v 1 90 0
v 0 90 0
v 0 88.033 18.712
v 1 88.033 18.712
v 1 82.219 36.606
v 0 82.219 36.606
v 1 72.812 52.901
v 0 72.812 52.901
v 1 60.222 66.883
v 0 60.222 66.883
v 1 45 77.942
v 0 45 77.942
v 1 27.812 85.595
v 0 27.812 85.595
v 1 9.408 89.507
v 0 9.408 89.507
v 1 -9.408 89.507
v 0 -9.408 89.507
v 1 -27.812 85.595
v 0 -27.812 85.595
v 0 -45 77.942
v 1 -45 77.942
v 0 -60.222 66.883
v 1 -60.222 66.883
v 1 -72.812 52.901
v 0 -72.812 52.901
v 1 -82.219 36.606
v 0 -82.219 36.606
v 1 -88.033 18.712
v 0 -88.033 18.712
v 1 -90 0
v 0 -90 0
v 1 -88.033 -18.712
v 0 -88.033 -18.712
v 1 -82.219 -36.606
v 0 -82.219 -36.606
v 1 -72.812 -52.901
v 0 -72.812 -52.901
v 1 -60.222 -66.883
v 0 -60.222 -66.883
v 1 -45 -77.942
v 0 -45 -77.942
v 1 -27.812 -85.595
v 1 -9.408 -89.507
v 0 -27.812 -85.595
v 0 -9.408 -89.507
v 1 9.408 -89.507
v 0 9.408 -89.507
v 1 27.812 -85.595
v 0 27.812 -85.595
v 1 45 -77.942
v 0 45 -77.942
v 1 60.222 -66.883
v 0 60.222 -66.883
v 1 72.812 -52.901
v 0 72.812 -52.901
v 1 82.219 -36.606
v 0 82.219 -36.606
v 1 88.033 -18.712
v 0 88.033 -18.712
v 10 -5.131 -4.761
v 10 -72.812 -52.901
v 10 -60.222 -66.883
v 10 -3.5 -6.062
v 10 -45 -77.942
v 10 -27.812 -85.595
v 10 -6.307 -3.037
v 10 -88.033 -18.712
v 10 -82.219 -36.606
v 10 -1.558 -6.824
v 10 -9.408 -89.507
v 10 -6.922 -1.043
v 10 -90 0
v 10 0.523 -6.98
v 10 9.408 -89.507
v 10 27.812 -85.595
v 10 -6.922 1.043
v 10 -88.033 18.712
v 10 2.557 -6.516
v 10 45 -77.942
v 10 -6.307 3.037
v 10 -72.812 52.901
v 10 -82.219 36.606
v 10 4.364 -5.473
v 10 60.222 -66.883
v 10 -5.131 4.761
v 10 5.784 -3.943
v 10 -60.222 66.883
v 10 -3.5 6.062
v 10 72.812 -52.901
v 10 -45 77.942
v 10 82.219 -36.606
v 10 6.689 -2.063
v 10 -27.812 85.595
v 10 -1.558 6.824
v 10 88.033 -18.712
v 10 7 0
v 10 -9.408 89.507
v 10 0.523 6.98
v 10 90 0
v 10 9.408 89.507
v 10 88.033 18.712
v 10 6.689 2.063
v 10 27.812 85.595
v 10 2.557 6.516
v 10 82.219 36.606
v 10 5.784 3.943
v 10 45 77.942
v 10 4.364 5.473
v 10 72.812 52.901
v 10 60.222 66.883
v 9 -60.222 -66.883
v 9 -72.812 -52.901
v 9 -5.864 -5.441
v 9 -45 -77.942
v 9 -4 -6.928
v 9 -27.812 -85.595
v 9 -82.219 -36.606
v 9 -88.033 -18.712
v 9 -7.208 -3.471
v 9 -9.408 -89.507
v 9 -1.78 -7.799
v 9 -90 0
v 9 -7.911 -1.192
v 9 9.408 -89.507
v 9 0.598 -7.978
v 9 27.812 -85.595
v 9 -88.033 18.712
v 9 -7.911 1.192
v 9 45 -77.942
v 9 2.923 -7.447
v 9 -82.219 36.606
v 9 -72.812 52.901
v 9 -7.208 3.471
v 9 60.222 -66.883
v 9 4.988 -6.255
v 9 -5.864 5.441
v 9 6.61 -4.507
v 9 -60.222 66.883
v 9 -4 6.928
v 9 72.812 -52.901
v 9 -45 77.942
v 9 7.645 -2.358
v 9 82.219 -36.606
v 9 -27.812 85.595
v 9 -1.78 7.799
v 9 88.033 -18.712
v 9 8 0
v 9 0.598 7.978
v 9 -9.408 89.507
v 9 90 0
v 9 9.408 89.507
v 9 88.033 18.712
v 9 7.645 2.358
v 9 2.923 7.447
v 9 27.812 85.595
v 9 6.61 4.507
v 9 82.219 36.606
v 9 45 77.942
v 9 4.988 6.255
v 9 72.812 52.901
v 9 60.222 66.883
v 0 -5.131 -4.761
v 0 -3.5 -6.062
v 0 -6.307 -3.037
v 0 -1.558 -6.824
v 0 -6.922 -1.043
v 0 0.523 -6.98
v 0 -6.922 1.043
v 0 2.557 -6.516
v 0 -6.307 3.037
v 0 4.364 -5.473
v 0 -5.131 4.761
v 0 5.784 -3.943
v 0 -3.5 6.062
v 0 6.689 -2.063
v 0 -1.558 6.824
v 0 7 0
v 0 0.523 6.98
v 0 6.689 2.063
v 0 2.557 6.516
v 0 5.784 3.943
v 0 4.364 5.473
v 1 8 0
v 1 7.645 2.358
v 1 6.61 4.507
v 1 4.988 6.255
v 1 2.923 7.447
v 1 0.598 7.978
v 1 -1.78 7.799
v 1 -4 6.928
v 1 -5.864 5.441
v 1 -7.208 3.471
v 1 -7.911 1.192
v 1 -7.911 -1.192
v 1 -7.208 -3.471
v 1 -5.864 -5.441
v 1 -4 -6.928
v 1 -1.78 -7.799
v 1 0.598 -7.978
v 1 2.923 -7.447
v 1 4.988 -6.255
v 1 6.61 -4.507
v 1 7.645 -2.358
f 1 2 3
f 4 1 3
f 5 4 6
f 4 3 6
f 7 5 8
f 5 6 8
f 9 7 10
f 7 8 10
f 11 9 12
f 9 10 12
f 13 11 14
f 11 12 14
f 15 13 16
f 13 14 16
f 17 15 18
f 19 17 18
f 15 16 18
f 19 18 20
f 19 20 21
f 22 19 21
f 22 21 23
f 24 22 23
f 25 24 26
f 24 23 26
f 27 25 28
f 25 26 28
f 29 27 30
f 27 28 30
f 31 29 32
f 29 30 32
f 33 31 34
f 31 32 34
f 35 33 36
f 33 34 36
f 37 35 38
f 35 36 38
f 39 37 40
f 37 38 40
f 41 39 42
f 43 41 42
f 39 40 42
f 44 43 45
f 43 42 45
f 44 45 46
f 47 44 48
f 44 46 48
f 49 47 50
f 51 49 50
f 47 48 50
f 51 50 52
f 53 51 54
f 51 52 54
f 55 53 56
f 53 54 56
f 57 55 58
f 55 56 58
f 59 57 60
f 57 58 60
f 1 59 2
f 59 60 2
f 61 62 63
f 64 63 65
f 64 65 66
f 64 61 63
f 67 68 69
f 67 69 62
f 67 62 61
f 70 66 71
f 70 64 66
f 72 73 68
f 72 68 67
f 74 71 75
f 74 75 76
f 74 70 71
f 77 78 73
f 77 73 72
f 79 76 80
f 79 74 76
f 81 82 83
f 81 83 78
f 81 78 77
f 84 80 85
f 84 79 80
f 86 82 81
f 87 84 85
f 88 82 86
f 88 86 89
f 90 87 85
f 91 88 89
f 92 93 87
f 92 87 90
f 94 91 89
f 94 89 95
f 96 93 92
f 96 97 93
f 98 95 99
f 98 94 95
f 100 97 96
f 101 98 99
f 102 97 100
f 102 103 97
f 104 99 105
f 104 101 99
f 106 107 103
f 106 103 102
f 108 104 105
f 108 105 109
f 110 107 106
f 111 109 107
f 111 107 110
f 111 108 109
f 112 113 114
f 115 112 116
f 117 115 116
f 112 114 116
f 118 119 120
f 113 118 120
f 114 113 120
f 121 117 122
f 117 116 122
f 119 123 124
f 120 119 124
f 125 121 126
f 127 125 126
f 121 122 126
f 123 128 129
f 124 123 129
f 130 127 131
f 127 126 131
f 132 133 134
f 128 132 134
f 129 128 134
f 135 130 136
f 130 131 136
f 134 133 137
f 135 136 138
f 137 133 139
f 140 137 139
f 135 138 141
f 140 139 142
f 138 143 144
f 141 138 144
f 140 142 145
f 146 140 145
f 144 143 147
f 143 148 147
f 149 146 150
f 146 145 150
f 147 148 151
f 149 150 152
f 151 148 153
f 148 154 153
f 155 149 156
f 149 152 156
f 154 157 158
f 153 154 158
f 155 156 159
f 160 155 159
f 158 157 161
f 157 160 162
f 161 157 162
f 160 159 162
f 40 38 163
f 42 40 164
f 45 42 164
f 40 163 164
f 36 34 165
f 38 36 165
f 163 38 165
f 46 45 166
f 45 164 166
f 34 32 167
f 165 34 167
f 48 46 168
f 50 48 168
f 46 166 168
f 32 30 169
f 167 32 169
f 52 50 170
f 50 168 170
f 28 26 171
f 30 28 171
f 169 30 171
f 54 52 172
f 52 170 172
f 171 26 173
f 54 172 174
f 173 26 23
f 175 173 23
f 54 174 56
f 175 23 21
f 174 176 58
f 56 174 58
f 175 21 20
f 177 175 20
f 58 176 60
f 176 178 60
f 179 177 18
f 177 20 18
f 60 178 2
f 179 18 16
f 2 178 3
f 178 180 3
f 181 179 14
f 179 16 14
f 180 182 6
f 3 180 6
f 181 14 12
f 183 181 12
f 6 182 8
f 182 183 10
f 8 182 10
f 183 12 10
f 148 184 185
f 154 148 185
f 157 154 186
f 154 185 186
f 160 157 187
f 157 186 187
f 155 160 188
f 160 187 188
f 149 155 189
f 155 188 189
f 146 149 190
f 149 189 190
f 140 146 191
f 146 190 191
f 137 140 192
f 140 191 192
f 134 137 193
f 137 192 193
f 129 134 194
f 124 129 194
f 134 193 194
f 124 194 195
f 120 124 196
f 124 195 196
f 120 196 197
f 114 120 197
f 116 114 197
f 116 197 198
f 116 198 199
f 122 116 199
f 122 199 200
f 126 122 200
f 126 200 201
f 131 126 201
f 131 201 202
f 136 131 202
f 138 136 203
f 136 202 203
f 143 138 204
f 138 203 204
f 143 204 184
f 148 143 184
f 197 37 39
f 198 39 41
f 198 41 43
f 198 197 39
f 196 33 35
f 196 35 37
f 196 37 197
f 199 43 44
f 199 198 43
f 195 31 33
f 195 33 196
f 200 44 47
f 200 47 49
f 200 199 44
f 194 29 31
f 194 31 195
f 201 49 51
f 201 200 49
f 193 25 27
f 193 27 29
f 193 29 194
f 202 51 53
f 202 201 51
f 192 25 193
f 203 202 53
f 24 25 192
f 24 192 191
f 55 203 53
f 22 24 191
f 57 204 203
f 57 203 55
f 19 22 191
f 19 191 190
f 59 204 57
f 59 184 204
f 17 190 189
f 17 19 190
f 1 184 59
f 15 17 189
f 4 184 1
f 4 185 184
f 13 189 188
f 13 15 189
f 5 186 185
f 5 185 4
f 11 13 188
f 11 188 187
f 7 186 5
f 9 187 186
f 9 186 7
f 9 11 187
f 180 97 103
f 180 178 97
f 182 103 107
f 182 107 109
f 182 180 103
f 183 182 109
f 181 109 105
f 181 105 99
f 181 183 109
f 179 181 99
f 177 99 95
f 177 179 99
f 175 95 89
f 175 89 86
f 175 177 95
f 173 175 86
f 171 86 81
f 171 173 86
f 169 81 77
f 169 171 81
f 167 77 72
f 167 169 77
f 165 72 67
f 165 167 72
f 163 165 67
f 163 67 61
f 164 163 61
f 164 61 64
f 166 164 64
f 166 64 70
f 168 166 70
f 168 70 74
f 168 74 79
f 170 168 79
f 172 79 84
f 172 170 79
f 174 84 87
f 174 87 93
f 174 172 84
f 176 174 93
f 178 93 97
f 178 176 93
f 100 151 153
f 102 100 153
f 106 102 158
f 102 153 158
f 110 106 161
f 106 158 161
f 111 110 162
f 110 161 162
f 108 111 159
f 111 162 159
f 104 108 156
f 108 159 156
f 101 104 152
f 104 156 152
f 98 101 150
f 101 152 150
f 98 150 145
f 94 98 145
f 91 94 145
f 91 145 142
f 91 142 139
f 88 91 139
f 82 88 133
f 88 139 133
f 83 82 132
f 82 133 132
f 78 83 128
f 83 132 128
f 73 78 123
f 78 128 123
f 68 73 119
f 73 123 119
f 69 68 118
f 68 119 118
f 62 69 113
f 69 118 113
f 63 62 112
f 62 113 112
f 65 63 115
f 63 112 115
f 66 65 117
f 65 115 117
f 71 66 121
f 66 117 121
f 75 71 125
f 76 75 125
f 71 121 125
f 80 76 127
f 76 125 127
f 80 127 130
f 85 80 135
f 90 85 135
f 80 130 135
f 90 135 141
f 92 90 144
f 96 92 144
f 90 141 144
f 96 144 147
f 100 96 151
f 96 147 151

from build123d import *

# Parameters (mm, degrees)
F0_R     = 90
F0_R_2   = 7
F1_DEPTH = 1
F2_R     = 8
F2_R_2   = 7
F3_DEPTH = 8
F4_R     = 90
F4_R_2   = 8
F4_R_3   = 7
F5_DEPTH = 1


with BuildPart() as f1:
    # F0 (on Right) → F1 (new body)
    with BuildSketch(Plane.YZ):
        Circle(F0_R)
        Circle(F0_R_2, mode=Mode.SUBTRACT)
    extrude(amount=F1_DEPTH)

    # F2 (on face) → F3 (join)
    with BuildSketch(Plane.YZ.offset(1)):
        Circle(F2_R)
        Circle(F2_R_2, mode=Mode.SUBTRACT)
    extrude(amount=F3_DEPTH)

    # F4 (on face) → F5 (join)
    with BuildSketch(Plane.YZ.offset(9)):
        Circle(F4_R)
        Circle(F4_R_2, mode=Mode.SUBTRACT)
        Circle(F4_R_2)
        Circle(F4_R_3, mode=Mode.SUBTRACT)
    extrude(amount=F5_DEPTH)


solid = f1.part
